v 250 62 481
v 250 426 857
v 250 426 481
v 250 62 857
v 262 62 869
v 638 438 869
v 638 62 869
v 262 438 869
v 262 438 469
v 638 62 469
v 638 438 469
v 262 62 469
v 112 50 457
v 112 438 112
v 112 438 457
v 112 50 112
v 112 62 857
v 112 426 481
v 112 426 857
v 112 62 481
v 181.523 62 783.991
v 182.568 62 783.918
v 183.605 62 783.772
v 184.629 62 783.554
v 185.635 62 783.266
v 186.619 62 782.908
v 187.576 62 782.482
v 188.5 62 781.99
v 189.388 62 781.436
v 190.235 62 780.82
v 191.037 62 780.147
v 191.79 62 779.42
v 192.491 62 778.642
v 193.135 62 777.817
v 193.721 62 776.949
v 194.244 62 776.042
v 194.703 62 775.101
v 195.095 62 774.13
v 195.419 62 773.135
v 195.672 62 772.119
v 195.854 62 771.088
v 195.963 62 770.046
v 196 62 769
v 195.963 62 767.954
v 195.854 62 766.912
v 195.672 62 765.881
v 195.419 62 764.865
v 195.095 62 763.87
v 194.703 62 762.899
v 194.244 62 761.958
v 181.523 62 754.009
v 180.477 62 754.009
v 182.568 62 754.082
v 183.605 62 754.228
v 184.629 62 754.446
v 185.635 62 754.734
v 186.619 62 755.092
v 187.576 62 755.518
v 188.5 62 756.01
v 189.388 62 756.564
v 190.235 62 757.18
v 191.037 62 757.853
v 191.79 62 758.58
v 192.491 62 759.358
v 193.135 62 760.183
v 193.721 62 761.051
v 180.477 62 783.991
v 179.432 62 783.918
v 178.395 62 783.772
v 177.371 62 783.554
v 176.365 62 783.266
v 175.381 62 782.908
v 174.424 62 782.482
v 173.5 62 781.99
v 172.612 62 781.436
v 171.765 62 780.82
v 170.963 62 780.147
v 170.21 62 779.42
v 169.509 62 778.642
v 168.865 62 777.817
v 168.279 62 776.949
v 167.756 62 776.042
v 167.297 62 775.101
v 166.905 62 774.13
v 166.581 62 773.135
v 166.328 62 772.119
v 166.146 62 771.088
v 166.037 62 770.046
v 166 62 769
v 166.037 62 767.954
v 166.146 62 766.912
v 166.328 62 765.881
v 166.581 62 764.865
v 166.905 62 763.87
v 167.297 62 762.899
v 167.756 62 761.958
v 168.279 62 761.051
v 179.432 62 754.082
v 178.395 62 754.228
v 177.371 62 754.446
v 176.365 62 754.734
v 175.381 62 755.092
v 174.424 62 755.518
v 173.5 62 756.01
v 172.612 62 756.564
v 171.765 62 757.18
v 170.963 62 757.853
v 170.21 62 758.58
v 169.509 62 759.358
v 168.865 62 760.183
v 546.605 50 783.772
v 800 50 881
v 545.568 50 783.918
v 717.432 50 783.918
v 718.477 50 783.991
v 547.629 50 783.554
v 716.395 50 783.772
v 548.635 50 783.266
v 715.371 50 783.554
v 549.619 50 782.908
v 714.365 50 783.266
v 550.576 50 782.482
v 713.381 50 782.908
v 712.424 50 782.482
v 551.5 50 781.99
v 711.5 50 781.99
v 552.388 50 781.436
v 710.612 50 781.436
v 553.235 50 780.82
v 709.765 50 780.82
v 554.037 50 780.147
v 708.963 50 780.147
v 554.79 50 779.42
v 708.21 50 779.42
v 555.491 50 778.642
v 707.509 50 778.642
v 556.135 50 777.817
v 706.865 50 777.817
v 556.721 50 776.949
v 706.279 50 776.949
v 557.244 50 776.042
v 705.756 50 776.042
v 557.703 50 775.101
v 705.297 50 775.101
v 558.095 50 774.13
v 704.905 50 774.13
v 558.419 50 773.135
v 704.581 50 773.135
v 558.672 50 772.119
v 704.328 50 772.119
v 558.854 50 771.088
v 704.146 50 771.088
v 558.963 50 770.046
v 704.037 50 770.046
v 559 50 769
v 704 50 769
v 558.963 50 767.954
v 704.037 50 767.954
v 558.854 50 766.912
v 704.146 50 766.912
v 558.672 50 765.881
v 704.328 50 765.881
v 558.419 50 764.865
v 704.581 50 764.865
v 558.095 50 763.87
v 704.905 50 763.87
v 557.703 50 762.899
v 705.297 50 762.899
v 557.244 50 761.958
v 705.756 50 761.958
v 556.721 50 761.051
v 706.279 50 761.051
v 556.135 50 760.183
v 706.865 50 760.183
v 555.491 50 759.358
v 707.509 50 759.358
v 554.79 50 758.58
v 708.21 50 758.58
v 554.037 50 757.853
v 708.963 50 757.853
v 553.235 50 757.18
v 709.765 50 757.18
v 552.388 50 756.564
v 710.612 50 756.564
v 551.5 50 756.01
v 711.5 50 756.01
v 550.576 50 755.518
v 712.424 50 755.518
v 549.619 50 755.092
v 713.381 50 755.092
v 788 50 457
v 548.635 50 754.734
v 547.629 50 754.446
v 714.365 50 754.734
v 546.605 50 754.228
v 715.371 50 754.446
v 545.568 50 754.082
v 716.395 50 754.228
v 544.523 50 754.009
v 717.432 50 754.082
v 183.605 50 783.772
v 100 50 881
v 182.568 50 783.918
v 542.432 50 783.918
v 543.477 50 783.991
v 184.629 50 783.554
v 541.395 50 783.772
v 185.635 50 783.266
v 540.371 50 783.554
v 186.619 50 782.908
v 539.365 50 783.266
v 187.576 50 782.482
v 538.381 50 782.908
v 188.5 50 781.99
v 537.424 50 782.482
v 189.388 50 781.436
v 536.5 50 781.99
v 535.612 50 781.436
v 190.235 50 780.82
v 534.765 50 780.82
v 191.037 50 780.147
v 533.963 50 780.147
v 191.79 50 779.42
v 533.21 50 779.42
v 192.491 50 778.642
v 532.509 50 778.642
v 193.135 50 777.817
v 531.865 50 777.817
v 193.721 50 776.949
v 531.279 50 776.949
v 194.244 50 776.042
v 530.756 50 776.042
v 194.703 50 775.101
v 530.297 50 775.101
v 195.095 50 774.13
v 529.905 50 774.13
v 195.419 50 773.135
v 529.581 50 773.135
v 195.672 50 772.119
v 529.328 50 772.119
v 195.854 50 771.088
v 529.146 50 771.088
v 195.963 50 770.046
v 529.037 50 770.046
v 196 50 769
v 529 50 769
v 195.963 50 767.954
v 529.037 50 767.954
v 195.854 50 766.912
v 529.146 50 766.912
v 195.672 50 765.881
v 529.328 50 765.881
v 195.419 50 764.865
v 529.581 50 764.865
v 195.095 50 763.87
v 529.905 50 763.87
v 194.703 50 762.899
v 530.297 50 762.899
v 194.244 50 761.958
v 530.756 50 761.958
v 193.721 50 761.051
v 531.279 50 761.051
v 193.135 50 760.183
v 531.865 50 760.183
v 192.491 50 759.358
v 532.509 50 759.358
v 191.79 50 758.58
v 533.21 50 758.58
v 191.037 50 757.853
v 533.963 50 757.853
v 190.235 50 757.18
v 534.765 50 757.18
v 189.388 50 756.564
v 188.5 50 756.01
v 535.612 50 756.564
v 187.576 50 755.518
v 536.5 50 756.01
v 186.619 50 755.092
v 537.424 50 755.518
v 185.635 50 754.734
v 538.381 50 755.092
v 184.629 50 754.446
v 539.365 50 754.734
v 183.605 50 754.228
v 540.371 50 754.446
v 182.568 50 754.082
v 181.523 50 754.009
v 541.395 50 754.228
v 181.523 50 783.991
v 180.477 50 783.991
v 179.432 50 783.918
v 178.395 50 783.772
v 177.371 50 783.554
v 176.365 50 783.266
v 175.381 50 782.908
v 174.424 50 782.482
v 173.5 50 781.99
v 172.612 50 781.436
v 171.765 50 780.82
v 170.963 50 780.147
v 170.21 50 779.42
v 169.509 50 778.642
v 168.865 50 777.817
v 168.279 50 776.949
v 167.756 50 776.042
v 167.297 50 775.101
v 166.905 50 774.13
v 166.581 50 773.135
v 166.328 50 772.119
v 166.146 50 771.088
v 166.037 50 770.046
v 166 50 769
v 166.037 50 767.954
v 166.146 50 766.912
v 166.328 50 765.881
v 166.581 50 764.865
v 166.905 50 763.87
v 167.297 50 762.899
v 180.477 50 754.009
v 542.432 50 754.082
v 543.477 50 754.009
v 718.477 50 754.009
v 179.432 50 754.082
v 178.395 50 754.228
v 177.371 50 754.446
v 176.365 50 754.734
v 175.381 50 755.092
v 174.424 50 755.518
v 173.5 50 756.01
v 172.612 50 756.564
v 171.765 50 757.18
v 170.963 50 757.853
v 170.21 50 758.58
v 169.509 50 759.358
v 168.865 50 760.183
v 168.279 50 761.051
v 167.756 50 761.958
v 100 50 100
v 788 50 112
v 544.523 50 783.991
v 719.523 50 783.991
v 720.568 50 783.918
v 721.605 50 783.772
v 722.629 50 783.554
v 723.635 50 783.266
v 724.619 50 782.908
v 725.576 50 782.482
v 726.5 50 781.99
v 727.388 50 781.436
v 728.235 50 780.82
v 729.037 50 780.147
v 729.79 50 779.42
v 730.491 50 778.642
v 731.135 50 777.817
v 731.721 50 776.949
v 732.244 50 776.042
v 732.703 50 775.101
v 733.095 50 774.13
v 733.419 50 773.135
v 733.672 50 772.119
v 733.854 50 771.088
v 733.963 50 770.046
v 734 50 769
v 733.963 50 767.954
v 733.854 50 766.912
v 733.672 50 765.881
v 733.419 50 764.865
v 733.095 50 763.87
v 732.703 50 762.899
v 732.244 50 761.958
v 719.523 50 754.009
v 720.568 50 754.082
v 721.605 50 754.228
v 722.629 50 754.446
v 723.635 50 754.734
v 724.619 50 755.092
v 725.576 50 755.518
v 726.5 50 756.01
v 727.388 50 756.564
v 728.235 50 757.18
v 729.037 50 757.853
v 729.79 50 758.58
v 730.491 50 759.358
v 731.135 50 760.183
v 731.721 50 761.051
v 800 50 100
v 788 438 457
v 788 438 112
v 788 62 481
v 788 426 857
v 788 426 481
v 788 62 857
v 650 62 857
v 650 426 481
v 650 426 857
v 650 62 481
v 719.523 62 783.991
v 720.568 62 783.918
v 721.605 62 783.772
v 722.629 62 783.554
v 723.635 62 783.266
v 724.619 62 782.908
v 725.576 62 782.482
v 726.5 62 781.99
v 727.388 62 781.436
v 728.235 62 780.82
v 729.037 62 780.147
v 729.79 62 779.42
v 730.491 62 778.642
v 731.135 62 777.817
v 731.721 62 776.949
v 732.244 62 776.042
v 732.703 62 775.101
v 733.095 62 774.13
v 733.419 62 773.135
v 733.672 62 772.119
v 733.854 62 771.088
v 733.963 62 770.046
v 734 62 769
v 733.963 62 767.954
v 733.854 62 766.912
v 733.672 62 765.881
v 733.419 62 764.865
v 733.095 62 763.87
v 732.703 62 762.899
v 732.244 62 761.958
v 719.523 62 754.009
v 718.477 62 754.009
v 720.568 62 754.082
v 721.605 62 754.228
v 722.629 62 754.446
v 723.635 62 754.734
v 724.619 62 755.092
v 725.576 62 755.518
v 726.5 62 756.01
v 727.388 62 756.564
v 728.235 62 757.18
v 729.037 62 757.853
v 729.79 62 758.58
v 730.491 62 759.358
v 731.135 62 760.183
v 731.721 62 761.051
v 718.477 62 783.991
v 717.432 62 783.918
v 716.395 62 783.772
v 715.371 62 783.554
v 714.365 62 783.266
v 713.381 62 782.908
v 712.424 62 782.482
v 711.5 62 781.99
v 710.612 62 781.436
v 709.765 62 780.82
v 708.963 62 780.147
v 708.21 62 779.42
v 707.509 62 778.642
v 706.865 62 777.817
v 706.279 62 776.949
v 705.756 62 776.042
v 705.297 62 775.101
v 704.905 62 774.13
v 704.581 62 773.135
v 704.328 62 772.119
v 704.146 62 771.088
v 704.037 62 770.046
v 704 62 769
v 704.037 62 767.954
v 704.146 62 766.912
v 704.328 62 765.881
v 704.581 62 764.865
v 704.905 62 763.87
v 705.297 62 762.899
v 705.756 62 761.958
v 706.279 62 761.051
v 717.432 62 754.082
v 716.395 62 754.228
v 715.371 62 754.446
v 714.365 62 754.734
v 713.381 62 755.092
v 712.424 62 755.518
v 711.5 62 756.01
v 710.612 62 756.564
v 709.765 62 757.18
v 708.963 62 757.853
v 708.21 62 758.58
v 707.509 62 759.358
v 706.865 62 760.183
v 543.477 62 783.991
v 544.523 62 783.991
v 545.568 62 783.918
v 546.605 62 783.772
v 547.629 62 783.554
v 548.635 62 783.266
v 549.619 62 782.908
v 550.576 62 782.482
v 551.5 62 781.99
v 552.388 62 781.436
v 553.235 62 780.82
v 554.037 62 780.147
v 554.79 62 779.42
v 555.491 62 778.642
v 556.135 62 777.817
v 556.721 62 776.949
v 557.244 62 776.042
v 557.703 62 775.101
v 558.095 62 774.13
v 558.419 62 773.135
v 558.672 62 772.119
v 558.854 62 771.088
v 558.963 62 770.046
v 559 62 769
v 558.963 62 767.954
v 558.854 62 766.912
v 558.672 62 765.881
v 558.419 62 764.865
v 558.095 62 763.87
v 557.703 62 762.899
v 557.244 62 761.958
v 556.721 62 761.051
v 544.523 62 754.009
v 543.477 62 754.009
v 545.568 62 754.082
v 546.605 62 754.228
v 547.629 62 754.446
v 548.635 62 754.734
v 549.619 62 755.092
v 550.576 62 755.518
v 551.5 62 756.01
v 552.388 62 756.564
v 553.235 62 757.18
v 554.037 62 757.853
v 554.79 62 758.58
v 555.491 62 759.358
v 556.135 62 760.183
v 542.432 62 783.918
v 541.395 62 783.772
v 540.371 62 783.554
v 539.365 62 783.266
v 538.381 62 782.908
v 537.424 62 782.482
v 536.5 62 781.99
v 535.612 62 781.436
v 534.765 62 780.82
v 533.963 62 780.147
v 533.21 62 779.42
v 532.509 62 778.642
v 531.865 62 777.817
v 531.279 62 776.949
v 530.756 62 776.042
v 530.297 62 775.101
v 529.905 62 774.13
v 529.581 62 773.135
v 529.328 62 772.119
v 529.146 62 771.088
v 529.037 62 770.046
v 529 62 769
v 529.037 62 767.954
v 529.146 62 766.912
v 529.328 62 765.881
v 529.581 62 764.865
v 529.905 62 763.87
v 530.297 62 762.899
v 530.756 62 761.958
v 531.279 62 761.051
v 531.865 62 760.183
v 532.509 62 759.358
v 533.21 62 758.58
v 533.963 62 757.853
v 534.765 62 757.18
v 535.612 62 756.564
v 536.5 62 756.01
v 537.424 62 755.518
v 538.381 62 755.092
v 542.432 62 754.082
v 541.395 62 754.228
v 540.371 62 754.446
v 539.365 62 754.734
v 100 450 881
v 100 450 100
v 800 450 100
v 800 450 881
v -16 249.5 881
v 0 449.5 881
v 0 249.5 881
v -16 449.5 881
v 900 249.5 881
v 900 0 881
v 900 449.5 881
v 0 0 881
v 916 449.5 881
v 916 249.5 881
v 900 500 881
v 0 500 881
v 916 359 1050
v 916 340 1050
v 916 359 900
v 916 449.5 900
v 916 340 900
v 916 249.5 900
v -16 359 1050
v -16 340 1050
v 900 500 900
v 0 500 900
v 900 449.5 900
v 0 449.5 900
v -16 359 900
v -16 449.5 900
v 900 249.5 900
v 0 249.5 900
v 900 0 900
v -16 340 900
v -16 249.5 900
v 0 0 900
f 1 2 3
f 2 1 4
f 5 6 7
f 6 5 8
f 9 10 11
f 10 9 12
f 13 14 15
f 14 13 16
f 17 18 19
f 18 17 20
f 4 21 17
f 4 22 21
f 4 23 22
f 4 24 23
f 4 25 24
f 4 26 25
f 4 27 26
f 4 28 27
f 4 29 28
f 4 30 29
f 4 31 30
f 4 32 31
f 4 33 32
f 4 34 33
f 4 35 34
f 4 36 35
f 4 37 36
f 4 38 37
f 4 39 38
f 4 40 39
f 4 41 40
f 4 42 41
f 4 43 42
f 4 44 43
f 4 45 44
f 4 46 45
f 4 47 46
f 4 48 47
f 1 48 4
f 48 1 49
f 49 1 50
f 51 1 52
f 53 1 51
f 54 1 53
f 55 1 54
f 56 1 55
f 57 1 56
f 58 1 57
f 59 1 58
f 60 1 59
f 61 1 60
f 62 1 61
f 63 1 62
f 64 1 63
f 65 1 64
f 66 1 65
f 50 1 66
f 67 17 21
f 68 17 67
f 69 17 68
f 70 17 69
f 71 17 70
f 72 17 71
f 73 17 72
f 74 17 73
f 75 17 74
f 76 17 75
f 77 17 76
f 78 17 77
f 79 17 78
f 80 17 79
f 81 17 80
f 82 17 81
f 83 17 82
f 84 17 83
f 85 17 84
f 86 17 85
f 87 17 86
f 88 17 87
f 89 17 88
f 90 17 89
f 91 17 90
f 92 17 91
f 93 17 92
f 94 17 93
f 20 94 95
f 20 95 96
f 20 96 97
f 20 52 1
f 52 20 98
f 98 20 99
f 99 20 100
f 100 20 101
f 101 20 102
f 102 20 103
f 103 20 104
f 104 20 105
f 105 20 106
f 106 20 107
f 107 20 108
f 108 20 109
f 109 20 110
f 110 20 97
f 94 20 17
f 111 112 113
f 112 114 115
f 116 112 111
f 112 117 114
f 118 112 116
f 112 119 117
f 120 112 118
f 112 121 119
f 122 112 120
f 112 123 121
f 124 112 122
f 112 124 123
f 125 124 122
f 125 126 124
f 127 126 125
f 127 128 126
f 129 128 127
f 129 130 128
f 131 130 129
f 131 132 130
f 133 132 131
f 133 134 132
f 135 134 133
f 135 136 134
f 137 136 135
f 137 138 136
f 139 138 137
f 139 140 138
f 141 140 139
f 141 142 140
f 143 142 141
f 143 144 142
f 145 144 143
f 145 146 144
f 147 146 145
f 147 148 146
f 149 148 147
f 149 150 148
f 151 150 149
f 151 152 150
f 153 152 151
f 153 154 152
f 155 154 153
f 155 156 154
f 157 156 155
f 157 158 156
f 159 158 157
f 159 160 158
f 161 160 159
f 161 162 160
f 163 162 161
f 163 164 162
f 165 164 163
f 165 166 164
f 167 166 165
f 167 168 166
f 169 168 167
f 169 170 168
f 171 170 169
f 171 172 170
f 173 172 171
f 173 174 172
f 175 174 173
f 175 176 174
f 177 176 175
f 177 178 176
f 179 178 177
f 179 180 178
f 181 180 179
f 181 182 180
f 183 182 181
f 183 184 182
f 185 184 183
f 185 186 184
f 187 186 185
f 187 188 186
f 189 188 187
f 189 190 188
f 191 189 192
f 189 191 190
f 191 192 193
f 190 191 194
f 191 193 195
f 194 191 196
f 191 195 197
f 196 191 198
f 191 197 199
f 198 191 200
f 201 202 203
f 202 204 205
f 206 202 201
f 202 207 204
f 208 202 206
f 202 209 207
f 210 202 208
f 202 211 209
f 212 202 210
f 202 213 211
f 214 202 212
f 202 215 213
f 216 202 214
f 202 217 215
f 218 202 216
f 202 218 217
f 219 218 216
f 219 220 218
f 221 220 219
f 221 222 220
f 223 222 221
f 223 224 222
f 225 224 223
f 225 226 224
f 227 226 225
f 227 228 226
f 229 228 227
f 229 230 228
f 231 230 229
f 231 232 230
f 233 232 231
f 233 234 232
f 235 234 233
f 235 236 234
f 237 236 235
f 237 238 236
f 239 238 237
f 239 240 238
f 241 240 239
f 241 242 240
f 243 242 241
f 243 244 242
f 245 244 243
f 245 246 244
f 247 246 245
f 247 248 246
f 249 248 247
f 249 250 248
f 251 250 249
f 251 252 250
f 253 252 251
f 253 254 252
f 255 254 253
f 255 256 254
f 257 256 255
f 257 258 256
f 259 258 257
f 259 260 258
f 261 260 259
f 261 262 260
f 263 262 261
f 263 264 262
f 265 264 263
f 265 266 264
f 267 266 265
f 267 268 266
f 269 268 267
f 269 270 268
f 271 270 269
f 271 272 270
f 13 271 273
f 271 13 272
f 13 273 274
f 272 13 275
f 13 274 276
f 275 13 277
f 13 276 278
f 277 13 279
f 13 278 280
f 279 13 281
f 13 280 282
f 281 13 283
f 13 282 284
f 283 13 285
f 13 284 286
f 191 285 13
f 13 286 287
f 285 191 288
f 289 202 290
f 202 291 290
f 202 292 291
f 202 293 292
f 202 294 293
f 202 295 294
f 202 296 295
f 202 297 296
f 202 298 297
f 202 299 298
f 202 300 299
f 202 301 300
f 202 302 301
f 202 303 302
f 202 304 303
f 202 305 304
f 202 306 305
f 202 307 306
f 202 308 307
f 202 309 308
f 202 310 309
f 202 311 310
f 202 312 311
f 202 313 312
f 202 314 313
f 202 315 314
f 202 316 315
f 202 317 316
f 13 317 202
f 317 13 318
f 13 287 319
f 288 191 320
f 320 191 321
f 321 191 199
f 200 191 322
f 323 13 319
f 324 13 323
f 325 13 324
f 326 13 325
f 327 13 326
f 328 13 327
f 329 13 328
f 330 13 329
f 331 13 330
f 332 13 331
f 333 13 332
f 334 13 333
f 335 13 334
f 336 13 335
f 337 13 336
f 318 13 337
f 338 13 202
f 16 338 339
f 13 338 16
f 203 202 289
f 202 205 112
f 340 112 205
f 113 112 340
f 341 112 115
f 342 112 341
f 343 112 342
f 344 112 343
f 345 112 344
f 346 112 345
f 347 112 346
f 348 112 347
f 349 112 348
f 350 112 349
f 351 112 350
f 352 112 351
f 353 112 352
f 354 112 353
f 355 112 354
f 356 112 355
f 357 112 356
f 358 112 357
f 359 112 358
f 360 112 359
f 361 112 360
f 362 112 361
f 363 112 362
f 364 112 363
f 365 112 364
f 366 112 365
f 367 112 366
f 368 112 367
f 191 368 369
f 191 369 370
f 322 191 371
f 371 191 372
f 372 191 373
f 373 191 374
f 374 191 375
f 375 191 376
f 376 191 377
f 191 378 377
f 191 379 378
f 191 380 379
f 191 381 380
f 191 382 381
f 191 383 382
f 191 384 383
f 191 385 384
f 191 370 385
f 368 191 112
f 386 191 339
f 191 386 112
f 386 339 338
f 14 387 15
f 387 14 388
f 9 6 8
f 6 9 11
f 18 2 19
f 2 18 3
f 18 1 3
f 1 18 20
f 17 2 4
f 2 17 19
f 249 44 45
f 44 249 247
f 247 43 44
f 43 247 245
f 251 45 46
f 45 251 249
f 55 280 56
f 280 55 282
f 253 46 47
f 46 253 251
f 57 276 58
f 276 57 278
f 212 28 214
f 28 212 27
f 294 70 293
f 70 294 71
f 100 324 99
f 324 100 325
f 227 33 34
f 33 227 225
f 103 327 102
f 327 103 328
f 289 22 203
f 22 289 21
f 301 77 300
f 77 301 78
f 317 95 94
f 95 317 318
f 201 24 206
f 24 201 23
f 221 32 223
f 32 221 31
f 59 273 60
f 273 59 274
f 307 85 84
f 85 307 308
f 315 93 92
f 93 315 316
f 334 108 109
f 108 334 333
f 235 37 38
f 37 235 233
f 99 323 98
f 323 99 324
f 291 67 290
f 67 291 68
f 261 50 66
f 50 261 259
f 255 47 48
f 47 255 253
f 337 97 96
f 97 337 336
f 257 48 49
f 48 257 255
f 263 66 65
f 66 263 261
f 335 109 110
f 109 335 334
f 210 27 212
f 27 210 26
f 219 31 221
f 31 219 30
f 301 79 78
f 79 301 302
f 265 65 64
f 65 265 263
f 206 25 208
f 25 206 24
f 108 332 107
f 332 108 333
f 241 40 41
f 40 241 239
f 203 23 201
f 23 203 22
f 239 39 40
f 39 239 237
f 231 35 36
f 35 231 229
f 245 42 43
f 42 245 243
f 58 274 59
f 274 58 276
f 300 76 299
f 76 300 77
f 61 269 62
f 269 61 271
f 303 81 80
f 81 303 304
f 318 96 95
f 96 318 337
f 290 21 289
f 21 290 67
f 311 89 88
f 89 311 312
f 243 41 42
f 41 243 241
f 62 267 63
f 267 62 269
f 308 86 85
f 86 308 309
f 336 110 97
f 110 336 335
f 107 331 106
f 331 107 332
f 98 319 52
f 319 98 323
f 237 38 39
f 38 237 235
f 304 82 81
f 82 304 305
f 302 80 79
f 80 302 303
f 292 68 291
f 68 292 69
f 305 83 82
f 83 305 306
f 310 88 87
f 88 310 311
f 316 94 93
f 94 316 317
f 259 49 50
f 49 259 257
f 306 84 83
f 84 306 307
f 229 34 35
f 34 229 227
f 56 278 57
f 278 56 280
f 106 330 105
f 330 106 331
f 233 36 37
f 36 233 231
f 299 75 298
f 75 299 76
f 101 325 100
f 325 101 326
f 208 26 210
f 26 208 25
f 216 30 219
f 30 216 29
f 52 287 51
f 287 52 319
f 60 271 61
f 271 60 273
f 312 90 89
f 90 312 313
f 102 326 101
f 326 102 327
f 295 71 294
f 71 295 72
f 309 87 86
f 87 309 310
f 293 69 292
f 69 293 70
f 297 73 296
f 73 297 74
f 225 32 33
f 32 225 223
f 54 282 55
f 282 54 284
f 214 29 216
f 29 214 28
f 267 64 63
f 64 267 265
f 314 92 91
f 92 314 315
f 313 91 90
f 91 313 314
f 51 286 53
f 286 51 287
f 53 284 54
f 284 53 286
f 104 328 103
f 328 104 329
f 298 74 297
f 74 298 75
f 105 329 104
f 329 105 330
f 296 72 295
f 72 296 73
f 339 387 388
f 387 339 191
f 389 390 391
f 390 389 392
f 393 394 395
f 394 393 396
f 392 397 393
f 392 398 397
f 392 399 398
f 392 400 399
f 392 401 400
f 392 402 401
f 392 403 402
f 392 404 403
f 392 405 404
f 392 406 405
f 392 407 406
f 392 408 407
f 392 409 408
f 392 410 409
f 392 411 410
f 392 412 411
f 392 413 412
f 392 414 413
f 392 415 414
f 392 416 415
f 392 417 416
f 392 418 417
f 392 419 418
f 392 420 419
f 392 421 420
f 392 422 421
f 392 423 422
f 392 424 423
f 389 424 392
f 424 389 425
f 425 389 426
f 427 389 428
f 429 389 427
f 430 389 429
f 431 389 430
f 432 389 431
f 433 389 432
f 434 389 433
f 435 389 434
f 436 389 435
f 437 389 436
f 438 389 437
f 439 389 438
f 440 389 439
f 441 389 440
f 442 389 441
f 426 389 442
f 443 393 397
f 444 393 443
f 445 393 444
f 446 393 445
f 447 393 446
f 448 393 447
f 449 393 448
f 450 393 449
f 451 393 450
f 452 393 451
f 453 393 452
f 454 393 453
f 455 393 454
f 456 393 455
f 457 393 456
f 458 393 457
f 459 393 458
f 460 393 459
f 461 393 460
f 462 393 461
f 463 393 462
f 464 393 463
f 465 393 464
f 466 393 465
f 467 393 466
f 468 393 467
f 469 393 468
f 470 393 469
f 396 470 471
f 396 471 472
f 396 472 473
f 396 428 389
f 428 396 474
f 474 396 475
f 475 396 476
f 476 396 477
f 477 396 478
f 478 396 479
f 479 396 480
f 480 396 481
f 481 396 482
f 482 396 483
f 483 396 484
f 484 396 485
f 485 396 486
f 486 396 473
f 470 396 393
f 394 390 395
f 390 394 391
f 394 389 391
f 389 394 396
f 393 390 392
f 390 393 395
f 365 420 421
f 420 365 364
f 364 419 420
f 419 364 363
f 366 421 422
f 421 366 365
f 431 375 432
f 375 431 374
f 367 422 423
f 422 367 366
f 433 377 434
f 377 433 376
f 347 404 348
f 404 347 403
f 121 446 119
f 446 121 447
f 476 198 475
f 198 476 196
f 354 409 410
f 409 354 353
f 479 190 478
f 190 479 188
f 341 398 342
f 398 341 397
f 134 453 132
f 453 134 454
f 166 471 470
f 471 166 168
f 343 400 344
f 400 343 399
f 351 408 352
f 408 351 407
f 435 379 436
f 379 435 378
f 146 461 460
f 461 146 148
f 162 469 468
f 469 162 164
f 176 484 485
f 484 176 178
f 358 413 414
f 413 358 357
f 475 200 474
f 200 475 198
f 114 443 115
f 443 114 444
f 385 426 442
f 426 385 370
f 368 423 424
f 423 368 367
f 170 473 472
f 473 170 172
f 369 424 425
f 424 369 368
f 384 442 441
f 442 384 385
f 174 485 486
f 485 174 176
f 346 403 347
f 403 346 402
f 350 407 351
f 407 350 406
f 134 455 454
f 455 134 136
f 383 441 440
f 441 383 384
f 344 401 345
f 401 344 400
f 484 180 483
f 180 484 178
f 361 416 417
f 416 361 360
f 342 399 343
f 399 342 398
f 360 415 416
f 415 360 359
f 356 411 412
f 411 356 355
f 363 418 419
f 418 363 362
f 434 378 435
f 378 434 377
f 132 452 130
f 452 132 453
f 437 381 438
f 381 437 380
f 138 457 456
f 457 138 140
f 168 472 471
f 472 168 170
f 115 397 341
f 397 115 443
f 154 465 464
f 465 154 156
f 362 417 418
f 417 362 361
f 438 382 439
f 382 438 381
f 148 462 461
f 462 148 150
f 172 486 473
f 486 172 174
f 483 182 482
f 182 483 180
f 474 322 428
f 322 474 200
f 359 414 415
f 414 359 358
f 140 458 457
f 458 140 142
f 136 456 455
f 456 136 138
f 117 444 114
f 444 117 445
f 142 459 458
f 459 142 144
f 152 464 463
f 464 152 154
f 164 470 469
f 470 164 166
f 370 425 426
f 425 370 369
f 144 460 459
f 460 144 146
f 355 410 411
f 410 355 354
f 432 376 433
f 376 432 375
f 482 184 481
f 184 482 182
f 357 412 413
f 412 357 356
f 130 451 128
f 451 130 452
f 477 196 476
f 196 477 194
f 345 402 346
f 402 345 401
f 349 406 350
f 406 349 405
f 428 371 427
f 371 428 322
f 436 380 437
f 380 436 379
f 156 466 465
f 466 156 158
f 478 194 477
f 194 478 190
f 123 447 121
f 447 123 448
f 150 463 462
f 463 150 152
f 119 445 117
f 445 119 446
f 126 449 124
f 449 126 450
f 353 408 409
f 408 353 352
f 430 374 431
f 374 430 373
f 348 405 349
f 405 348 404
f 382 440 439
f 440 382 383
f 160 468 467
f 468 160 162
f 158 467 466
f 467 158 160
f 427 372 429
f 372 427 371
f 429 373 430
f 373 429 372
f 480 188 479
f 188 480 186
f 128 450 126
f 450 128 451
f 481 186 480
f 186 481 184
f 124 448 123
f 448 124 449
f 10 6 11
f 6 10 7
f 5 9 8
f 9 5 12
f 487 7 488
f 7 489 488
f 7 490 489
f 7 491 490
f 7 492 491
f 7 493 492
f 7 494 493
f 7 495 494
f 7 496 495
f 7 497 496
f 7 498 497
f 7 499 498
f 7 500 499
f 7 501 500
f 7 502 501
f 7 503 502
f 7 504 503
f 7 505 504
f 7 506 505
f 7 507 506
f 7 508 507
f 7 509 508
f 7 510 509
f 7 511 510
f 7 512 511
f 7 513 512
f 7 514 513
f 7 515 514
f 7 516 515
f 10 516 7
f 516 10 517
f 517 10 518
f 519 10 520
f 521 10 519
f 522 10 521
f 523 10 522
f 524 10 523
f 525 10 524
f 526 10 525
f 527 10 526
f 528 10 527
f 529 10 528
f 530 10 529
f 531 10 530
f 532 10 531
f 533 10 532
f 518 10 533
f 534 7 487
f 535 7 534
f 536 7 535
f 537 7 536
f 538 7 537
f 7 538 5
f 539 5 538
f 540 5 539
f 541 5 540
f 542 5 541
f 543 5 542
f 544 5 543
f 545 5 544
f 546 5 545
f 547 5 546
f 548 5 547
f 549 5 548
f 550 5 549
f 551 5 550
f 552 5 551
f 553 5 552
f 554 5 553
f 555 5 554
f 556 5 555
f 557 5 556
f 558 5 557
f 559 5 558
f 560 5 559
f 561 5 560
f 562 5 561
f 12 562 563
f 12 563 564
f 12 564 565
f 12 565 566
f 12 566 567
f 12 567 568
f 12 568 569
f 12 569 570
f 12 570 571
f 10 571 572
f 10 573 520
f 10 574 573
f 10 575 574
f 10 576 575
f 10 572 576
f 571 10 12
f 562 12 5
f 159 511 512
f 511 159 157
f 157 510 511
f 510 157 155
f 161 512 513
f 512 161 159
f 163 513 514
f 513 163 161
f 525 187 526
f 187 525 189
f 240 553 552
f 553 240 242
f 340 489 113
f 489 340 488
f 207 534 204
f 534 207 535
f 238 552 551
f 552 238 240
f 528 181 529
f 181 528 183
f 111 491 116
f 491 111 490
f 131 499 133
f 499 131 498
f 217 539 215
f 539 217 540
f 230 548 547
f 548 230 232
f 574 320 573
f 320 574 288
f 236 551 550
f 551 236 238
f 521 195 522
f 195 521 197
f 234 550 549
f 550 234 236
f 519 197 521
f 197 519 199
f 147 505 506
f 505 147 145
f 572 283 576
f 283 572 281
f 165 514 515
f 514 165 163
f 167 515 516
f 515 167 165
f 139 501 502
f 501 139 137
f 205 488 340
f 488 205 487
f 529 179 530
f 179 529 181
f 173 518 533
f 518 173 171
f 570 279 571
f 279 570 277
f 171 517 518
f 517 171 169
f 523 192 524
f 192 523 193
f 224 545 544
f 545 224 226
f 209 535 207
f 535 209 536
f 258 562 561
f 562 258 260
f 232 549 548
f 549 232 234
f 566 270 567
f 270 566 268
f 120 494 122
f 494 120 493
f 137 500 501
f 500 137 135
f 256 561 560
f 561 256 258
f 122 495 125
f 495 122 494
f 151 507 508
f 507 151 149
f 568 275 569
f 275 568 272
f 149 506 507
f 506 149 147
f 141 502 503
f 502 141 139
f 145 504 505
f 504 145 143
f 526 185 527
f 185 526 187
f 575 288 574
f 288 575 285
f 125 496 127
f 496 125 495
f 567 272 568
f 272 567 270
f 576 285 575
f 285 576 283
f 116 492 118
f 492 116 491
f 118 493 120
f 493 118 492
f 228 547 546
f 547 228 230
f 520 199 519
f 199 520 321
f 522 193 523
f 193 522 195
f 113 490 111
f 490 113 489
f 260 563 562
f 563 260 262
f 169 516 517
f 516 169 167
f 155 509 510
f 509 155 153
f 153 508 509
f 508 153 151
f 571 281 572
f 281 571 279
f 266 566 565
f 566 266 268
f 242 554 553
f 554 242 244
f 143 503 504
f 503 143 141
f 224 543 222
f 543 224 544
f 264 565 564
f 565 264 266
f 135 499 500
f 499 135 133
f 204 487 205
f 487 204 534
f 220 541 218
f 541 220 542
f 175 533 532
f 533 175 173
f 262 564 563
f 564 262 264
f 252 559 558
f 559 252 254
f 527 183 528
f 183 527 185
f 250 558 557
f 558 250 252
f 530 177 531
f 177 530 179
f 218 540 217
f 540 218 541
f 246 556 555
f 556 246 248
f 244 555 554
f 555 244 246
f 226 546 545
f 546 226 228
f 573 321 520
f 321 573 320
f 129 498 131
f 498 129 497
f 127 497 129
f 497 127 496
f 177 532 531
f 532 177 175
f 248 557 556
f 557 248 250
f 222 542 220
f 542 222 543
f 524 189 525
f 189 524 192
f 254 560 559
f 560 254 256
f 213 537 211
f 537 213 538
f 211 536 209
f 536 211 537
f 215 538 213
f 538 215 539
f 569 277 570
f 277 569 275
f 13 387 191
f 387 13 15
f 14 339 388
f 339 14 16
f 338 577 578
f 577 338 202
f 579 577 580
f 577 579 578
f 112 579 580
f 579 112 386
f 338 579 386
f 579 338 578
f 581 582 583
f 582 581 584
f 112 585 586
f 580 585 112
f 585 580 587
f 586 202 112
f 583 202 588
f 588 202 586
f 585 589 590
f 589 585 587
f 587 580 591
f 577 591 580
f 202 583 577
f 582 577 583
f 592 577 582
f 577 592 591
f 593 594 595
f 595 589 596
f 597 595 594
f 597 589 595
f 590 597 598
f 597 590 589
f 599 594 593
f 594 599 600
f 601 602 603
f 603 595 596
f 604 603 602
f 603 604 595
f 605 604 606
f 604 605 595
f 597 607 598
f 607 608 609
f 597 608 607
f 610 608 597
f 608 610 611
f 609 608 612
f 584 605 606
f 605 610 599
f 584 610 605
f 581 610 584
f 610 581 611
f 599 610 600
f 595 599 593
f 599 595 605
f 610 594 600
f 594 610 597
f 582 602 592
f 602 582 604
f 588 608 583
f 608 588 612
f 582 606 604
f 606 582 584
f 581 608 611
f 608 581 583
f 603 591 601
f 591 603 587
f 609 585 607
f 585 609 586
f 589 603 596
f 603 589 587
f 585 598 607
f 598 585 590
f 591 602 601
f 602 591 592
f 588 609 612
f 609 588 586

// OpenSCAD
// file: door.scad
/*
    Door
    
    By Anton Augustsson
*/

module door (
    thicknessPlywood,
    height,
    width,
    x,y,z
    ){
/*
    ---------- Local varibles ---------- 
*/

holeDiameter = 30;


/*
    ---------- Code ---------- 
*/
  
translate([
    x,
    y,
    z])
difference () {
union () {

// Front
translate([
    0,
    0,
    0])
cube([
    width,
    thicknessPlywood,
    height]);

}
translate([
    width/4*3,
    -1,
    height/4*3])
rotate([-90,0,0])
cylinder(
    h = thicknessPlywood+2,
    r = holeDiameter/2
    );

}
}


/*
    ---------- Example ---------- 
*/

sideOverhangWidth = 100;
sideOverhangDepth = 50;

thicknessMdf = 19;
thicknessPlywood = 12; 

totalHeight = 900;
totalWidth = 900; // t-profile
totalDepth = 500;

foundationHeight = 
    totalHeight
    -thicknessMdf;
foundationWidth = 
    totalWidth
    -sideOverhangWidth*2;
foundationDepth =
    totalDepth
    -sideOverhangDepth*2;

routerBoxHeight = 400;
routerBoxWidth = 400;        
positionShelfHeight = 
        foundationHeight
        -thicknessPlywood*2
        -routerBoxHeight;

sideHeight = 
        foundationHeight
        -thicknessPlywood*2;


door (
    thicknessPlywood,
    routerBoxHeight,
    routerBoxWidth,
    0,0,0
    );
// file: router-drawer.scad
/*
    Router-drawer
    
    By Anton Augustsson
*/

module routerDrawer (
    thicknessPlywood,
    height,
    width,
    depth,
    x,y,z
    ){
/*
    ---------- Local varibles ---------- 
*/

holeDiameter = 30;


/*
    ---------- Code ---------- 
*/
  
translate([
    x,
    y,
    z])
difference () {
union () {

// Front
translate([
    0,
    0,
    0])
cube([
    width,
    thicknessPlywood,
    height]);

// Back
translate([
    0,
    depth-thicknessPlywood,
    0])
cube([
    width,
    thicknessPlywood,
    height]);

// Bottom
translate([
    0,
    thicknessPlywood,
    0])
cube([
    width,
    depth-thicknessPlywood*2,
    thicknessPlywood]);

// Top
translate([
    0,
    thicknessPlywood,
    height-thicknessPlywood])
cube([
    width,
    depth-thicknessPlywood*2,
    thicknessPlywood]);
}
translate([
    width/2,
    -1,
    height/4*3])
rotate([-90,0,0])
cylinder(
    h = thicknessPlywood+2,
    r = holeDiameter/2
    );

}
}


/*
    ---------- Example ---------- 
*/

sideOverhangWidth = 100;
sideOverhangDepth = 50;

thicknessMdf = 19;
thicknessPlywood = 12; 

totalHeight = 900;
totalWidth = 900; // t-profile
totalDepth = 500;

foundationHeight = 
    totalHeight
    -thicknessMdf;
foundationWidth = 
    totalWidth
    -sideOverhangWidth*2;
foundationDepth =
    totalDepth
    -sideOverhangDepth*2;

routerBoxHeight = 400;
routerBoxWidth = 400;        
positionShelfHeight = 
        foundationHeight
        -thicknessPlywood*2
        -routerBoxHeight;

sideHeight = 
        foundationHeight
        -thicknessPlywood*2;


routerDrawer (
    thicknessPlywood,
    routerBoxHeight,
    (routerBoxWidth-thicknessPlywood*2)/2,
    foundationDepth-thicknessPlywood,
    0,0,0
    );
// file: foundation.scad
/*
    Foundation
    
    By Anton Augustsson
*/

use <router-drawer.scad>;
use <door.scad>;

module foundation (
    thicknessPlywood,
    foundationHeight,
    foundationWidth,
    foundationDepth,
    x,y,z
    ){
/*
    ---------- Local varibles ---------- 
*/

routerBoxHeight = 400;
routerBoxWidth = 400;        
positionShelfHeight = 
        foundationHeight
        -thicknessPlywood*2
        -routerBoxHeight;

sideHeight = 
        foundationHeight
        -thicknessPlywood*2;

boxWidth = (foundationWidth
        -routerBoxWidth
        -thicknessPlywood*2)/2;
boxDepth = foundationDepth-
        thicknessPlywood;
        
/*
    ---------- Code ---------- 
*/
  
translate([
    x,
    y,
    z])
union () {

// Side Left
translate([
    0,
    0,
    thicknessPlywood])
cube([
    thicknessPlywood,
    foundationDepth,
    sideHeight]);

// Side Right
translate([
    foundationWidth
    -thicknessPlywood,
    0,
    thicknessPlywood])
cube([
    thicknessPlywood,
    foundationDepth,
    sideHeight]);

// bottom
translate([
    0,
    0,
    0])
cube([
    foundationWidth,
    foundationDepth,
    thicknessPlywood]);

// top
translate([
    0,
    0,
    foundationHeight-thicknessPlywood])
cube([
    foundationWidth,
    foundationDepth,
    thicknessPlywood]);

// Back
translate([
    0,
    foundationDepth-thicknessPlywood,
    thicknessPlywood])
cube([
    foundationWidth,
    thicknessPlywood,
    sideHeight]);

union () {
// Shelf
translate([
    thicknessPlywood,
    0,
    positionShelfHeight])
cube([
    foundationWidth-thicknessPlywood*2,
    foundationDepth-thicknessPlywood,
    thicknessPlywood]);

// Box side left
translate([
    foundationWidth/2-routerBoxWidth/2,
    0,
    positionShelfHeight
    +thicknessPlywood])
cube([
    thicknessPlywood,
    foundationDepth-thicknessPlywood,
    routerBoxHeight]);

// Box side right
translate([
    foundationWidth/2+routerBoxWidth/2
    -thicknessPlywood,
    0,
    positionShelfHeight
    +thicknessPlywood])
cube([
    thicknessPlywood,
    foundationDepth-thicknessPlywood,
    routerBoxHeight]);

// Drawer box left
routerDrawer (
    thicknessPlywood,
    routerBoxHeight,
    boxWidth,
    boxDepth,
    thicknessPlywood,0,
    positionShelfHeight
    +thicknessPlywood
    );

// Drawer box right
routerDrawer (
    thicknessPlywood,
    routerBoxHeight,
    boxWidth,
    boxDepth,
    foundationWidth
    -boxWidth-thicknessPlywood,0,
    positionShelfHeight
    +thicknessPlywood
    );
    
// Router door
door (
    thicknessPlywood,
    routerBoxHeight,
    routerBoxWidth-thicknessPlywood*2,
    boxWidth+thicknessPlywood*2,0,
    positionShelfHeight
    +thicknessPlywood
    );
}
}
}


/*
    ---------- Example ---------- 
*/

sideOverhangWidth = 100;
sideOverhangDepth = 50;

thicknessMdf = 19;
thicknessPlywood = 12; 

totalHeight = 900;
totalWidth = 900; // t-profile
totalDepth = 500;

foundationHeight = 
    totalHeight
    -thicknessMdf;
foundationWidth = 
    totalWidth
    -sideOverhangWidth*2;
foundationDepth =
    totalDepth
    -sideOverhangDepth*2;


foundation (
    thicknessPlywood,
    foundationHeight,
    foundationWidth,
    foundationDepth,
    0,0,0
    );
// file: top.scad
/*
    top
*/

module top (
    thicknessMdf,
    totalWidth,
    totalDepth,
    x,y,z
    ){
/*
    ---------- Local varibles ---------- 
*/

//routerBoxHeight = 400;
//positionShelfHeight = ;
fenceHeight = 150;
sliderWidth = 16;
sliderHeight = thicknessMdf;
sliderDepth = 200;
        
/*
    ---------- Code ---------- 
*/
  
translate([
    x,
    y,
    z])
union () {

// Top
translate([
    0,
    0,
    0])
cube([
    totalWidth,
    totalDepth,
    thicknessMdf]);

// ---------- Fence ----------
translate([
    0,
    340,
    0])
union () {

// Fence
translate([
    -sliderWidth,
    0,
    thicknessMdf])
cube([
    totalWidth+sliderWidth*2,
    thicknessMdf,
    fenceHeight]);

// Slider 1
translate([
    -sliderWidth,
    -sliderDepth/2+thicknessMdf/2,
    0])
cube([
    sliderWidth,
    sliderDepth,
    sliderHeight]);
      
// Slider 2
translate([
    totalWidth,
    -sliderDepth/2+thicknessMdf/2,
    0])
cube([
    sliderWidth,
    sliderDepth,
    sliderHeight]);
    
}
}
}


/*
    ---------- Example ---------- 
*/

sideOverhangWidth = 100;
sideOverhangDepth = 50;

thicknessMdf = 19;
thicknessPlywood = 12; 

totalHeight = 900;
totalWidth = 900; // t-profile
totalDepth = 500;

foundationHeight = 
    totalHeight
    -thicknessMdf;
foundationWidth = 
    totalWidth
    -sideOverhangWidth*2;
foundationDepth =
    totalDepth
    -sideOverhangDepth*2;

top (
    thicknessMdf,
    totalWidth,
    totalDepth,
    0,0,0
    );
// main file
/*
    Drill bit storage
*/

use <top.scad>;
use <foundation.scad>;

/*
    ---------- Variables ---------- 
*/

$fn=90;  // accuracy


sideOverhangWidth = 100;
sideOverhangDepth = 50;

thicknessMdf = 19;
thicknessPlywood = 12; 

castersHeight = 100;

totalHeight = 900-castersHeight;
totalWidth = 900; // t-profile
totalDepth = 500;

foundationHeight = 
    totalHeight
    -thicknessMdf;
foundationWidth = 
    totalWidth
    -sideOverhangWidth*2;
foundationDepth =
    totalDepth
    -sideOverhangDepth*2;



/*
    ---------- Code ---------- 
*/


// ---------- Foundation ---------- 
foundation (
    thicknessPlywood,
    foundationHeight,
    foundationWidth,
    foundationDepth,
    totalWidth/2-foundationWidth/2,
    sideOverhangDepth,castersHeight
    );

// ---------- Top---------- 
top (
    thicknessMdf,
    totalWidth,
    totalDepth,
    0,0,
    totalHeight-thicknessMdf
    +castersHeight
    );
